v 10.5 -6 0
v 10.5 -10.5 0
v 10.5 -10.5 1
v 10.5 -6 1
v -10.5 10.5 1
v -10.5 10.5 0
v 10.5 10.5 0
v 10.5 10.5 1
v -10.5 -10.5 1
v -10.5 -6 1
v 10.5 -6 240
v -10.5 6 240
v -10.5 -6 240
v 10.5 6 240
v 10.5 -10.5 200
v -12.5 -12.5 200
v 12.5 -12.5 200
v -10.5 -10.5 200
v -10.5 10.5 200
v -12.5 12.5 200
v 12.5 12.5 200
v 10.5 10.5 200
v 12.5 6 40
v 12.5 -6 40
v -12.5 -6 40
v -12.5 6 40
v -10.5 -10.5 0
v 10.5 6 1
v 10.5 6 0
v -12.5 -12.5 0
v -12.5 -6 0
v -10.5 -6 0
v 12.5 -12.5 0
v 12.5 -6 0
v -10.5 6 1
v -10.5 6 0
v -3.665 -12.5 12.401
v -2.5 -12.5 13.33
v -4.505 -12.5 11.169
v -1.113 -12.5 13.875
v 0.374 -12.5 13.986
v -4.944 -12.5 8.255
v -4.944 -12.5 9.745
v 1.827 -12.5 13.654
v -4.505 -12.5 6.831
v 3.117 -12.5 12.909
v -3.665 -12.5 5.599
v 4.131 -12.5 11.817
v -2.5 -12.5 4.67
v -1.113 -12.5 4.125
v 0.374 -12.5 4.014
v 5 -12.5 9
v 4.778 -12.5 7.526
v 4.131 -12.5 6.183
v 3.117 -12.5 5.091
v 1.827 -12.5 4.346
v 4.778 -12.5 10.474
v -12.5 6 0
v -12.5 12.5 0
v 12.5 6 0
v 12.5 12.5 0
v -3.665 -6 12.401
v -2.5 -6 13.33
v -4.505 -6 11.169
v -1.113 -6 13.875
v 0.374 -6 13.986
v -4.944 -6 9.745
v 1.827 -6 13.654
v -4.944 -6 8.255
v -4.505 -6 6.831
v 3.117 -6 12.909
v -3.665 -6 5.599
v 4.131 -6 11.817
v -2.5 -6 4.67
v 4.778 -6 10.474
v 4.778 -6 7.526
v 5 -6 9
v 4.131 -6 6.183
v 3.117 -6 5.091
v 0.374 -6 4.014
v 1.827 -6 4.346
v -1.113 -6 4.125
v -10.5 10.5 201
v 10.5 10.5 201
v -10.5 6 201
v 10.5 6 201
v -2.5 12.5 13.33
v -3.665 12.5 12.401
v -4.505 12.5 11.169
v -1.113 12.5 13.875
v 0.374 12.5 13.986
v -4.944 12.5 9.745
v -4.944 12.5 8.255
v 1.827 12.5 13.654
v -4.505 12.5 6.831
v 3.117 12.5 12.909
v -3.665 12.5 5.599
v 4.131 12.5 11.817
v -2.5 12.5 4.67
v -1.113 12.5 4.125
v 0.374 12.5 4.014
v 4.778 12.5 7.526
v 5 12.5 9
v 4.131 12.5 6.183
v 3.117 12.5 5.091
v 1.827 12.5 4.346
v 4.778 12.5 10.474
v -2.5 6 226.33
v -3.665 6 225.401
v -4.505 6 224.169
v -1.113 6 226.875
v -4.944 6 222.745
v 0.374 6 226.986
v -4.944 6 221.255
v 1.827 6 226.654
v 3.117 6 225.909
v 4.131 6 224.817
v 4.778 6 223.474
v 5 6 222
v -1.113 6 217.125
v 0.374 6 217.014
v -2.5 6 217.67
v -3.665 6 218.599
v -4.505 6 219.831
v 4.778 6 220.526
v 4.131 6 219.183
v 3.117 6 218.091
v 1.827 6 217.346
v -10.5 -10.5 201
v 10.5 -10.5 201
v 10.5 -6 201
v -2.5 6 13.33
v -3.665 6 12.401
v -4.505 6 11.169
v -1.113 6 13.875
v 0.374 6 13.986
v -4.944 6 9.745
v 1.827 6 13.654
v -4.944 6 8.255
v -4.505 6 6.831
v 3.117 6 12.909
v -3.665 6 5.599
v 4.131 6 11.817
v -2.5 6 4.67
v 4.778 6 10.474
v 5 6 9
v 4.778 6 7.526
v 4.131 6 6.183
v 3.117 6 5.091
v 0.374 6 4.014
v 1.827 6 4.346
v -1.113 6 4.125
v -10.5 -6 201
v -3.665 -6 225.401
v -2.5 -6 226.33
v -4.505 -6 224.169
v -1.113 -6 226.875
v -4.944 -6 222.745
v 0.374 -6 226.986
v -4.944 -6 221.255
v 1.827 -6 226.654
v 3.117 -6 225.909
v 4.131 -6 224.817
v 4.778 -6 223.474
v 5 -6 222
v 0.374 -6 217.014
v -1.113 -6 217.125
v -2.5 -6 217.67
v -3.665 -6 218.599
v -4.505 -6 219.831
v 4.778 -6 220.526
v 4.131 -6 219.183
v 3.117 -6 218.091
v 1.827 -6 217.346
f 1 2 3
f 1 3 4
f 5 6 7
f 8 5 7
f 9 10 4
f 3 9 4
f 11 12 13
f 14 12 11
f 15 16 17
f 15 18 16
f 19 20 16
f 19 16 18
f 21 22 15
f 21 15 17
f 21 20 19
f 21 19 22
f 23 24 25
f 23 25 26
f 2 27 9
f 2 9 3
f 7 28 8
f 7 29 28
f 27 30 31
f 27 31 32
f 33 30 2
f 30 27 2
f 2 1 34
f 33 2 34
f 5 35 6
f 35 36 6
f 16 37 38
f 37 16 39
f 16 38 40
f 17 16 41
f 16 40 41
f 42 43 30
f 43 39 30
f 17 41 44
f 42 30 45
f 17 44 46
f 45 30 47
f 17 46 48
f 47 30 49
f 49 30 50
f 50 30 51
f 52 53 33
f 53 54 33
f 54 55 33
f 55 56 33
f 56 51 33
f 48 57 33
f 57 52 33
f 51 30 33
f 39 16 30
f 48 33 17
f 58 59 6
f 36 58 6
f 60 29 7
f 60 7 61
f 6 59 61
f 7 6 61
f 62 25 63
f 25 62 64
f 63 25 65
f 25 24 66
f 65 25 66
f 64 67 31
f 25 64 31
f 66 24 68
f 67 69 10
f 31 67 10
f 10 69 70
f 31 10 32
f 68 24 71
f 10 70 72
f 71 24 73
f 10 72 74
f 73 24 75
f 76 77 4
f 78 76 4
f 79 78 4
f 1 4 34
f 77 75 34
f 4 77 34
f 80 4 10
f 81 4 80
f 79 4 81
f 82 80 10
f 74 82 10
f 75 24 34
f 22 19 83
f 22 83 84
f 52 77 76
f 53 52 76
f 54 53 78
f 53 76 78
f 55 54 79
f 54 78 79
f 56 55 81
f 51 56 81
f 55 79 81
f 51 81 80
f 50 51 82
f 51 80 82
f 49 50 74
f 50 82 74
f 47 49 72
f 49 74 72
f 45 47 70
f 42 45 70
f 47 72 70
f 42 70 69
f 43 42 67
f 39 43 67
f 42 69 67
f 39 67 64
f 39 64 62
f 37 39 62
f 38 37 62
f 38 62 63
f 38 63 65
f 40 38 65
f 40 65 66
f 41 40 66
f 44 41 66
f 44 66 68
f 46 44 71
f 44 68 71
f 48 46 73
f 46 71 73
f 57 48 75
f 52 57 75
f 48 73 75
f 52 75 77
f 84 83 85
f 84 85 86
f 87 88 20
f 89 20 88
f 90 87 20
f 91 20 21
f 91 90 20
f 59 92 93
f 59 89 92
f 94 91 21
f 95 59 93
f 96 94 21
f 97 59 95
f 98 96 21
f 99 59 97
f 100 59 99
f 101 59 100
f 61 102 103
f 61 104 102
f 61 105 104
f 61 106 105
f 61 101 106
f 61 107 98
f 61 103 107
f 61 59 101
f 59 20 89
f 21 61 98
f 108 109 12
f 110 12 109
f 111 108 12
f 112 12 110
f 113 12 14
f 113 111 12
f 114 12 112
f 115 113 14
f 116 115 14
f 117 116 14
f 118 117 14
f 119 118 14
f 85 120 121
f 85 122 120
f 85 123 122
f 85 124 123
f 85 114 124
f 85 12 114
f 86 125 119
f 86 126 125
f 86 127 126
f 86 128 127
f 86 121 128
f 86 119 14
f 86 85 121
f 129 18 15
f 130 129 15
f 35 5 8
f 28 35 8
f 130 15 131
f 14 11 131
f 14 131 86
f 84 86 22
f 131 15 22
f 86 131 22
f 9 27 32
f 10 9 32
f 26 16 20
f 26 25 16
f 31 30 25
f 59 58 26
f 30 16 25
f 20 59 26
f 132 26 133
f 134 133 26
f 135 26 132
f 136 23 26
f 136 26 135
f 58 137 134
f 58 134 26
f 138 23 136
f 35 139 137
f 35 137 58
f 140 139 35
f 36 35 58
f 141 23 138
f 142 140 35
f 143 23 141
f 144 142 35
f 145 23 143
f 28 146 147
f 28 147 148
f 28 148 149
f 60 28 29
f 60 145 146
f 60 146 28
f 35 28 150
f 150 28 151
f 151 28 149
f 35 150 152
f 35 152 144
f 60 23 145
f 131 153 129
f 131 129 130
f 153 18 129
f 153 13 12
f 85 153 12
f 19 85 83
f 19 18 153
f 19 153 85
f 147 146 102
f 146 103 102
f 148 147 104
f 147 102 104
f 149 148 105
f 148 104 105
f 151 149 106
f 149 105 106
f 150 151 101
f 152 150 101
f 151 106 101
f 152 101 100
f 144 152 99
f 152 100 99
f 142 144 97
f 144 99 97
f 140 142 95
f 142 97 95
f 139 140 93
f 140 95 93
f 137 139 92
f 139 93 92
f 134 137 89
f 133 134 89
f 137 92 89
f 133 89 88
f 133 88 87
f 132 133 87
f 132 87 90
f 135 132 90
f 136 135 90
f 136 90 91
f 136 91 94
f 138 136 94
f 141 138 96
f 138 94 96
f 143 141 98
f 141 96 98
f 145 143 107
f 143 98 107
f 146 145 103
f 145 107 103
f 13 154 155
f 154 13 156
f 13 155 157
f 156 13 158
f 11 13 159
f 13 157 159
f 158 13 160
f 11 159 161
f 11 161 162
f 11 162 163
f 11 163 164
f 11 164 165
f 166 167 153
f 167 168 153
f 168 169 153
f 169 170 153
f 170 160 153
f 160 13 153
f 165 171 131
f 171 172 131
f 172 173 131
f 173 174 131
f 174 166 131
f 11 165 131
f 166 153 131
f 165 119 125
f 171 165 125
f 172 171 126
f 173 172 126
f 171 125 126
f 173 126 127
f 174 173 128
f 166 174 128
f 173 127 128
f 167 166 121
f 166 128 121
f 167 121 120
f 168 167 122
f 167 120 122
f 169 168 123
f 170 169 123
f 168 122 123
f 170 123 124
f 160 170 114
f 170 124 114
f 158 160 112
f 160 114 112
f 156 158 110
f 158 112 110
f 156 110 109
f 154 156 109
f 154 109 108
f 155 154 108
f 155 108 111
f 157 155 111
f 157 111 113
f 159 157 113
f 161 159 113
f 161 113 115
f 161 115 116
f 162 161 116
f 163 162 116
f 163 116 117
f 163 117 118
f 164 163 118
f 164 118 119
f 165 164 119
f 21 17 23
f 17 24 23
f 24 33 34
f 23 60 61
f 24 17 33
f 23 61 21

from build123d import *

# Parameters (mm, degrees)
SKETCH1_W                = 25
SKETCH1_H                = 25
SKETCH1_W_2              = 21
SKETCH1_H_2              = 21
BOSS_EXTRUDE1_DEPTH      = 200
SKETCH2_W                = 40
SKETCH2_H                = 12
CUT_EXTRUDE1_DEPTH       = 26
SKETCH3_R                = 5
CUT_EXTRUDE2_DEPTH       = 26
BOSS_EXTRUDE2_START      = -40
SKETCH5_W                = 21
SKETCH5_H                = 21
BOSS_EXTRUDE2_DEPTH      = 1
BOSS_EXTRUDE2_DEPTH_BACK = 199
SKETCH3_2_R              = 5
CUT_EXTRUDE4_DEPTH       = 239
SKETCH6_W                = 21
SKETCH6_H                = 12
CUT_EXTRUDE5_DEPTH       = 39
SKETCH8_W                = 21
SKETCH8_H                = 12
BOSS_EXTRUDE3_DEPTH      = 40
SKETCH9_R                = 5
CUT_EXTRUDE6_DEPTH       = 19.5


with BuildPart() as part:
    # Sketch1 → Boss-Extrude1 (new body)
    with BuildSketch(Plane.XY):
        Rectangle(SKETCH1_W, SKETCH1_H)
        Rectangle(SKETCH1_W_2, SKETCH1_H_2, mode=Mode.SUBTRACT)
    extrude(amount=BOSS_EXTRUDE1_DEPTH)

    # Sketch2 → Cut-Extrude1 (cut, through all)
    with BuildSketch(Plane(origin=(12.5, 0, 0), x_dir=(0, 0, -1), z_dir=(1, 0, 0))):
        with Locations((-20, 0)):
            Rectangle(SKETCH2_W, SKETCH2_H)
    extrude(amount=-CUT_EXTRUDE1_DEPTH, mode=Mode.SUBTRACT)

    # Sketch3 → Cut-Extrude2 (cut, through all)
    with BuildSketch(Plane(origin=(0, 12.5, 0), x_dir=(1, 0, 0), z_dir=(0, 1, 0))):
        with Locations((0, -9)):
            Circle(SKETCH3_R)
    extrude(amount=-CUT_EXTRUDE2_DEPTH, mode=Mode.SUBTRACT)

    # Sketch5 → Boss-Extrude2 (add, two sides)
    with BuildSketch(Plane.XY.offset(240).offset(BOSS_EXTRUDE2_START)) as boss_extrude2_sk:
        Rectangle(SKETCH5_W, SKETCH5_H)
    extrude(amount=BOSS_EXTRUDE2_DEPTH)
    extrude(boss_extrude2_sk.sketch, amount=-BOSS_EXTRUDE2_DEPTH_BACK)

    # Sketch3<2> → Cut-Extrude4 (cut)
    with BuildSketch(Plane(origin=(0, 12.5, 0), x_dir=(1, 0, 0), z_dir=(0, 1, 0))):
        with Locations((0, -9)):
            Circle(SKETCH3_2_R)
    extrude(amount=-CUT_EXTRUDE4_DEPTH, mode=Mode.SUBTRACT)

    # Sketch6 → Cut-Extrude5 (cut)
    with BuildSketch(Plane(origin=(0, 0, 1), x_dir=(-1, 0, 0), z_dir=(0, 0, -1))):
        Rectangle(SKETCH6_W, SKETCH6_H)
    extrude(amount=-CUT_EXTRUDE5_DEPTH, mode=Mode.SUBTRACT)

    # Sketch8 → Boss-Extrude3 (add)
    with BuildSketch(Plane.XY.offset(200)):
        Rectangle(SKETCH8_W, SKETCH8_H)
    extrude(amount=BOSS_EXTRUDE3_DEPTH)

    # Sketch9 → Cut-Extrude6 (cut, through all)
    with BuildSketch(Plane(origin=(0, 6, 0), x_dir=(1, 0, 0), z_dir=(0, 1, 0))):
        with Locations((0, -222)):
            Circle(SKETCH9_R)
    extrude(amount=-CUT_EXTRUDE6_DEPTH, mode=Mode.SUBTRACT)


solid = part.part
